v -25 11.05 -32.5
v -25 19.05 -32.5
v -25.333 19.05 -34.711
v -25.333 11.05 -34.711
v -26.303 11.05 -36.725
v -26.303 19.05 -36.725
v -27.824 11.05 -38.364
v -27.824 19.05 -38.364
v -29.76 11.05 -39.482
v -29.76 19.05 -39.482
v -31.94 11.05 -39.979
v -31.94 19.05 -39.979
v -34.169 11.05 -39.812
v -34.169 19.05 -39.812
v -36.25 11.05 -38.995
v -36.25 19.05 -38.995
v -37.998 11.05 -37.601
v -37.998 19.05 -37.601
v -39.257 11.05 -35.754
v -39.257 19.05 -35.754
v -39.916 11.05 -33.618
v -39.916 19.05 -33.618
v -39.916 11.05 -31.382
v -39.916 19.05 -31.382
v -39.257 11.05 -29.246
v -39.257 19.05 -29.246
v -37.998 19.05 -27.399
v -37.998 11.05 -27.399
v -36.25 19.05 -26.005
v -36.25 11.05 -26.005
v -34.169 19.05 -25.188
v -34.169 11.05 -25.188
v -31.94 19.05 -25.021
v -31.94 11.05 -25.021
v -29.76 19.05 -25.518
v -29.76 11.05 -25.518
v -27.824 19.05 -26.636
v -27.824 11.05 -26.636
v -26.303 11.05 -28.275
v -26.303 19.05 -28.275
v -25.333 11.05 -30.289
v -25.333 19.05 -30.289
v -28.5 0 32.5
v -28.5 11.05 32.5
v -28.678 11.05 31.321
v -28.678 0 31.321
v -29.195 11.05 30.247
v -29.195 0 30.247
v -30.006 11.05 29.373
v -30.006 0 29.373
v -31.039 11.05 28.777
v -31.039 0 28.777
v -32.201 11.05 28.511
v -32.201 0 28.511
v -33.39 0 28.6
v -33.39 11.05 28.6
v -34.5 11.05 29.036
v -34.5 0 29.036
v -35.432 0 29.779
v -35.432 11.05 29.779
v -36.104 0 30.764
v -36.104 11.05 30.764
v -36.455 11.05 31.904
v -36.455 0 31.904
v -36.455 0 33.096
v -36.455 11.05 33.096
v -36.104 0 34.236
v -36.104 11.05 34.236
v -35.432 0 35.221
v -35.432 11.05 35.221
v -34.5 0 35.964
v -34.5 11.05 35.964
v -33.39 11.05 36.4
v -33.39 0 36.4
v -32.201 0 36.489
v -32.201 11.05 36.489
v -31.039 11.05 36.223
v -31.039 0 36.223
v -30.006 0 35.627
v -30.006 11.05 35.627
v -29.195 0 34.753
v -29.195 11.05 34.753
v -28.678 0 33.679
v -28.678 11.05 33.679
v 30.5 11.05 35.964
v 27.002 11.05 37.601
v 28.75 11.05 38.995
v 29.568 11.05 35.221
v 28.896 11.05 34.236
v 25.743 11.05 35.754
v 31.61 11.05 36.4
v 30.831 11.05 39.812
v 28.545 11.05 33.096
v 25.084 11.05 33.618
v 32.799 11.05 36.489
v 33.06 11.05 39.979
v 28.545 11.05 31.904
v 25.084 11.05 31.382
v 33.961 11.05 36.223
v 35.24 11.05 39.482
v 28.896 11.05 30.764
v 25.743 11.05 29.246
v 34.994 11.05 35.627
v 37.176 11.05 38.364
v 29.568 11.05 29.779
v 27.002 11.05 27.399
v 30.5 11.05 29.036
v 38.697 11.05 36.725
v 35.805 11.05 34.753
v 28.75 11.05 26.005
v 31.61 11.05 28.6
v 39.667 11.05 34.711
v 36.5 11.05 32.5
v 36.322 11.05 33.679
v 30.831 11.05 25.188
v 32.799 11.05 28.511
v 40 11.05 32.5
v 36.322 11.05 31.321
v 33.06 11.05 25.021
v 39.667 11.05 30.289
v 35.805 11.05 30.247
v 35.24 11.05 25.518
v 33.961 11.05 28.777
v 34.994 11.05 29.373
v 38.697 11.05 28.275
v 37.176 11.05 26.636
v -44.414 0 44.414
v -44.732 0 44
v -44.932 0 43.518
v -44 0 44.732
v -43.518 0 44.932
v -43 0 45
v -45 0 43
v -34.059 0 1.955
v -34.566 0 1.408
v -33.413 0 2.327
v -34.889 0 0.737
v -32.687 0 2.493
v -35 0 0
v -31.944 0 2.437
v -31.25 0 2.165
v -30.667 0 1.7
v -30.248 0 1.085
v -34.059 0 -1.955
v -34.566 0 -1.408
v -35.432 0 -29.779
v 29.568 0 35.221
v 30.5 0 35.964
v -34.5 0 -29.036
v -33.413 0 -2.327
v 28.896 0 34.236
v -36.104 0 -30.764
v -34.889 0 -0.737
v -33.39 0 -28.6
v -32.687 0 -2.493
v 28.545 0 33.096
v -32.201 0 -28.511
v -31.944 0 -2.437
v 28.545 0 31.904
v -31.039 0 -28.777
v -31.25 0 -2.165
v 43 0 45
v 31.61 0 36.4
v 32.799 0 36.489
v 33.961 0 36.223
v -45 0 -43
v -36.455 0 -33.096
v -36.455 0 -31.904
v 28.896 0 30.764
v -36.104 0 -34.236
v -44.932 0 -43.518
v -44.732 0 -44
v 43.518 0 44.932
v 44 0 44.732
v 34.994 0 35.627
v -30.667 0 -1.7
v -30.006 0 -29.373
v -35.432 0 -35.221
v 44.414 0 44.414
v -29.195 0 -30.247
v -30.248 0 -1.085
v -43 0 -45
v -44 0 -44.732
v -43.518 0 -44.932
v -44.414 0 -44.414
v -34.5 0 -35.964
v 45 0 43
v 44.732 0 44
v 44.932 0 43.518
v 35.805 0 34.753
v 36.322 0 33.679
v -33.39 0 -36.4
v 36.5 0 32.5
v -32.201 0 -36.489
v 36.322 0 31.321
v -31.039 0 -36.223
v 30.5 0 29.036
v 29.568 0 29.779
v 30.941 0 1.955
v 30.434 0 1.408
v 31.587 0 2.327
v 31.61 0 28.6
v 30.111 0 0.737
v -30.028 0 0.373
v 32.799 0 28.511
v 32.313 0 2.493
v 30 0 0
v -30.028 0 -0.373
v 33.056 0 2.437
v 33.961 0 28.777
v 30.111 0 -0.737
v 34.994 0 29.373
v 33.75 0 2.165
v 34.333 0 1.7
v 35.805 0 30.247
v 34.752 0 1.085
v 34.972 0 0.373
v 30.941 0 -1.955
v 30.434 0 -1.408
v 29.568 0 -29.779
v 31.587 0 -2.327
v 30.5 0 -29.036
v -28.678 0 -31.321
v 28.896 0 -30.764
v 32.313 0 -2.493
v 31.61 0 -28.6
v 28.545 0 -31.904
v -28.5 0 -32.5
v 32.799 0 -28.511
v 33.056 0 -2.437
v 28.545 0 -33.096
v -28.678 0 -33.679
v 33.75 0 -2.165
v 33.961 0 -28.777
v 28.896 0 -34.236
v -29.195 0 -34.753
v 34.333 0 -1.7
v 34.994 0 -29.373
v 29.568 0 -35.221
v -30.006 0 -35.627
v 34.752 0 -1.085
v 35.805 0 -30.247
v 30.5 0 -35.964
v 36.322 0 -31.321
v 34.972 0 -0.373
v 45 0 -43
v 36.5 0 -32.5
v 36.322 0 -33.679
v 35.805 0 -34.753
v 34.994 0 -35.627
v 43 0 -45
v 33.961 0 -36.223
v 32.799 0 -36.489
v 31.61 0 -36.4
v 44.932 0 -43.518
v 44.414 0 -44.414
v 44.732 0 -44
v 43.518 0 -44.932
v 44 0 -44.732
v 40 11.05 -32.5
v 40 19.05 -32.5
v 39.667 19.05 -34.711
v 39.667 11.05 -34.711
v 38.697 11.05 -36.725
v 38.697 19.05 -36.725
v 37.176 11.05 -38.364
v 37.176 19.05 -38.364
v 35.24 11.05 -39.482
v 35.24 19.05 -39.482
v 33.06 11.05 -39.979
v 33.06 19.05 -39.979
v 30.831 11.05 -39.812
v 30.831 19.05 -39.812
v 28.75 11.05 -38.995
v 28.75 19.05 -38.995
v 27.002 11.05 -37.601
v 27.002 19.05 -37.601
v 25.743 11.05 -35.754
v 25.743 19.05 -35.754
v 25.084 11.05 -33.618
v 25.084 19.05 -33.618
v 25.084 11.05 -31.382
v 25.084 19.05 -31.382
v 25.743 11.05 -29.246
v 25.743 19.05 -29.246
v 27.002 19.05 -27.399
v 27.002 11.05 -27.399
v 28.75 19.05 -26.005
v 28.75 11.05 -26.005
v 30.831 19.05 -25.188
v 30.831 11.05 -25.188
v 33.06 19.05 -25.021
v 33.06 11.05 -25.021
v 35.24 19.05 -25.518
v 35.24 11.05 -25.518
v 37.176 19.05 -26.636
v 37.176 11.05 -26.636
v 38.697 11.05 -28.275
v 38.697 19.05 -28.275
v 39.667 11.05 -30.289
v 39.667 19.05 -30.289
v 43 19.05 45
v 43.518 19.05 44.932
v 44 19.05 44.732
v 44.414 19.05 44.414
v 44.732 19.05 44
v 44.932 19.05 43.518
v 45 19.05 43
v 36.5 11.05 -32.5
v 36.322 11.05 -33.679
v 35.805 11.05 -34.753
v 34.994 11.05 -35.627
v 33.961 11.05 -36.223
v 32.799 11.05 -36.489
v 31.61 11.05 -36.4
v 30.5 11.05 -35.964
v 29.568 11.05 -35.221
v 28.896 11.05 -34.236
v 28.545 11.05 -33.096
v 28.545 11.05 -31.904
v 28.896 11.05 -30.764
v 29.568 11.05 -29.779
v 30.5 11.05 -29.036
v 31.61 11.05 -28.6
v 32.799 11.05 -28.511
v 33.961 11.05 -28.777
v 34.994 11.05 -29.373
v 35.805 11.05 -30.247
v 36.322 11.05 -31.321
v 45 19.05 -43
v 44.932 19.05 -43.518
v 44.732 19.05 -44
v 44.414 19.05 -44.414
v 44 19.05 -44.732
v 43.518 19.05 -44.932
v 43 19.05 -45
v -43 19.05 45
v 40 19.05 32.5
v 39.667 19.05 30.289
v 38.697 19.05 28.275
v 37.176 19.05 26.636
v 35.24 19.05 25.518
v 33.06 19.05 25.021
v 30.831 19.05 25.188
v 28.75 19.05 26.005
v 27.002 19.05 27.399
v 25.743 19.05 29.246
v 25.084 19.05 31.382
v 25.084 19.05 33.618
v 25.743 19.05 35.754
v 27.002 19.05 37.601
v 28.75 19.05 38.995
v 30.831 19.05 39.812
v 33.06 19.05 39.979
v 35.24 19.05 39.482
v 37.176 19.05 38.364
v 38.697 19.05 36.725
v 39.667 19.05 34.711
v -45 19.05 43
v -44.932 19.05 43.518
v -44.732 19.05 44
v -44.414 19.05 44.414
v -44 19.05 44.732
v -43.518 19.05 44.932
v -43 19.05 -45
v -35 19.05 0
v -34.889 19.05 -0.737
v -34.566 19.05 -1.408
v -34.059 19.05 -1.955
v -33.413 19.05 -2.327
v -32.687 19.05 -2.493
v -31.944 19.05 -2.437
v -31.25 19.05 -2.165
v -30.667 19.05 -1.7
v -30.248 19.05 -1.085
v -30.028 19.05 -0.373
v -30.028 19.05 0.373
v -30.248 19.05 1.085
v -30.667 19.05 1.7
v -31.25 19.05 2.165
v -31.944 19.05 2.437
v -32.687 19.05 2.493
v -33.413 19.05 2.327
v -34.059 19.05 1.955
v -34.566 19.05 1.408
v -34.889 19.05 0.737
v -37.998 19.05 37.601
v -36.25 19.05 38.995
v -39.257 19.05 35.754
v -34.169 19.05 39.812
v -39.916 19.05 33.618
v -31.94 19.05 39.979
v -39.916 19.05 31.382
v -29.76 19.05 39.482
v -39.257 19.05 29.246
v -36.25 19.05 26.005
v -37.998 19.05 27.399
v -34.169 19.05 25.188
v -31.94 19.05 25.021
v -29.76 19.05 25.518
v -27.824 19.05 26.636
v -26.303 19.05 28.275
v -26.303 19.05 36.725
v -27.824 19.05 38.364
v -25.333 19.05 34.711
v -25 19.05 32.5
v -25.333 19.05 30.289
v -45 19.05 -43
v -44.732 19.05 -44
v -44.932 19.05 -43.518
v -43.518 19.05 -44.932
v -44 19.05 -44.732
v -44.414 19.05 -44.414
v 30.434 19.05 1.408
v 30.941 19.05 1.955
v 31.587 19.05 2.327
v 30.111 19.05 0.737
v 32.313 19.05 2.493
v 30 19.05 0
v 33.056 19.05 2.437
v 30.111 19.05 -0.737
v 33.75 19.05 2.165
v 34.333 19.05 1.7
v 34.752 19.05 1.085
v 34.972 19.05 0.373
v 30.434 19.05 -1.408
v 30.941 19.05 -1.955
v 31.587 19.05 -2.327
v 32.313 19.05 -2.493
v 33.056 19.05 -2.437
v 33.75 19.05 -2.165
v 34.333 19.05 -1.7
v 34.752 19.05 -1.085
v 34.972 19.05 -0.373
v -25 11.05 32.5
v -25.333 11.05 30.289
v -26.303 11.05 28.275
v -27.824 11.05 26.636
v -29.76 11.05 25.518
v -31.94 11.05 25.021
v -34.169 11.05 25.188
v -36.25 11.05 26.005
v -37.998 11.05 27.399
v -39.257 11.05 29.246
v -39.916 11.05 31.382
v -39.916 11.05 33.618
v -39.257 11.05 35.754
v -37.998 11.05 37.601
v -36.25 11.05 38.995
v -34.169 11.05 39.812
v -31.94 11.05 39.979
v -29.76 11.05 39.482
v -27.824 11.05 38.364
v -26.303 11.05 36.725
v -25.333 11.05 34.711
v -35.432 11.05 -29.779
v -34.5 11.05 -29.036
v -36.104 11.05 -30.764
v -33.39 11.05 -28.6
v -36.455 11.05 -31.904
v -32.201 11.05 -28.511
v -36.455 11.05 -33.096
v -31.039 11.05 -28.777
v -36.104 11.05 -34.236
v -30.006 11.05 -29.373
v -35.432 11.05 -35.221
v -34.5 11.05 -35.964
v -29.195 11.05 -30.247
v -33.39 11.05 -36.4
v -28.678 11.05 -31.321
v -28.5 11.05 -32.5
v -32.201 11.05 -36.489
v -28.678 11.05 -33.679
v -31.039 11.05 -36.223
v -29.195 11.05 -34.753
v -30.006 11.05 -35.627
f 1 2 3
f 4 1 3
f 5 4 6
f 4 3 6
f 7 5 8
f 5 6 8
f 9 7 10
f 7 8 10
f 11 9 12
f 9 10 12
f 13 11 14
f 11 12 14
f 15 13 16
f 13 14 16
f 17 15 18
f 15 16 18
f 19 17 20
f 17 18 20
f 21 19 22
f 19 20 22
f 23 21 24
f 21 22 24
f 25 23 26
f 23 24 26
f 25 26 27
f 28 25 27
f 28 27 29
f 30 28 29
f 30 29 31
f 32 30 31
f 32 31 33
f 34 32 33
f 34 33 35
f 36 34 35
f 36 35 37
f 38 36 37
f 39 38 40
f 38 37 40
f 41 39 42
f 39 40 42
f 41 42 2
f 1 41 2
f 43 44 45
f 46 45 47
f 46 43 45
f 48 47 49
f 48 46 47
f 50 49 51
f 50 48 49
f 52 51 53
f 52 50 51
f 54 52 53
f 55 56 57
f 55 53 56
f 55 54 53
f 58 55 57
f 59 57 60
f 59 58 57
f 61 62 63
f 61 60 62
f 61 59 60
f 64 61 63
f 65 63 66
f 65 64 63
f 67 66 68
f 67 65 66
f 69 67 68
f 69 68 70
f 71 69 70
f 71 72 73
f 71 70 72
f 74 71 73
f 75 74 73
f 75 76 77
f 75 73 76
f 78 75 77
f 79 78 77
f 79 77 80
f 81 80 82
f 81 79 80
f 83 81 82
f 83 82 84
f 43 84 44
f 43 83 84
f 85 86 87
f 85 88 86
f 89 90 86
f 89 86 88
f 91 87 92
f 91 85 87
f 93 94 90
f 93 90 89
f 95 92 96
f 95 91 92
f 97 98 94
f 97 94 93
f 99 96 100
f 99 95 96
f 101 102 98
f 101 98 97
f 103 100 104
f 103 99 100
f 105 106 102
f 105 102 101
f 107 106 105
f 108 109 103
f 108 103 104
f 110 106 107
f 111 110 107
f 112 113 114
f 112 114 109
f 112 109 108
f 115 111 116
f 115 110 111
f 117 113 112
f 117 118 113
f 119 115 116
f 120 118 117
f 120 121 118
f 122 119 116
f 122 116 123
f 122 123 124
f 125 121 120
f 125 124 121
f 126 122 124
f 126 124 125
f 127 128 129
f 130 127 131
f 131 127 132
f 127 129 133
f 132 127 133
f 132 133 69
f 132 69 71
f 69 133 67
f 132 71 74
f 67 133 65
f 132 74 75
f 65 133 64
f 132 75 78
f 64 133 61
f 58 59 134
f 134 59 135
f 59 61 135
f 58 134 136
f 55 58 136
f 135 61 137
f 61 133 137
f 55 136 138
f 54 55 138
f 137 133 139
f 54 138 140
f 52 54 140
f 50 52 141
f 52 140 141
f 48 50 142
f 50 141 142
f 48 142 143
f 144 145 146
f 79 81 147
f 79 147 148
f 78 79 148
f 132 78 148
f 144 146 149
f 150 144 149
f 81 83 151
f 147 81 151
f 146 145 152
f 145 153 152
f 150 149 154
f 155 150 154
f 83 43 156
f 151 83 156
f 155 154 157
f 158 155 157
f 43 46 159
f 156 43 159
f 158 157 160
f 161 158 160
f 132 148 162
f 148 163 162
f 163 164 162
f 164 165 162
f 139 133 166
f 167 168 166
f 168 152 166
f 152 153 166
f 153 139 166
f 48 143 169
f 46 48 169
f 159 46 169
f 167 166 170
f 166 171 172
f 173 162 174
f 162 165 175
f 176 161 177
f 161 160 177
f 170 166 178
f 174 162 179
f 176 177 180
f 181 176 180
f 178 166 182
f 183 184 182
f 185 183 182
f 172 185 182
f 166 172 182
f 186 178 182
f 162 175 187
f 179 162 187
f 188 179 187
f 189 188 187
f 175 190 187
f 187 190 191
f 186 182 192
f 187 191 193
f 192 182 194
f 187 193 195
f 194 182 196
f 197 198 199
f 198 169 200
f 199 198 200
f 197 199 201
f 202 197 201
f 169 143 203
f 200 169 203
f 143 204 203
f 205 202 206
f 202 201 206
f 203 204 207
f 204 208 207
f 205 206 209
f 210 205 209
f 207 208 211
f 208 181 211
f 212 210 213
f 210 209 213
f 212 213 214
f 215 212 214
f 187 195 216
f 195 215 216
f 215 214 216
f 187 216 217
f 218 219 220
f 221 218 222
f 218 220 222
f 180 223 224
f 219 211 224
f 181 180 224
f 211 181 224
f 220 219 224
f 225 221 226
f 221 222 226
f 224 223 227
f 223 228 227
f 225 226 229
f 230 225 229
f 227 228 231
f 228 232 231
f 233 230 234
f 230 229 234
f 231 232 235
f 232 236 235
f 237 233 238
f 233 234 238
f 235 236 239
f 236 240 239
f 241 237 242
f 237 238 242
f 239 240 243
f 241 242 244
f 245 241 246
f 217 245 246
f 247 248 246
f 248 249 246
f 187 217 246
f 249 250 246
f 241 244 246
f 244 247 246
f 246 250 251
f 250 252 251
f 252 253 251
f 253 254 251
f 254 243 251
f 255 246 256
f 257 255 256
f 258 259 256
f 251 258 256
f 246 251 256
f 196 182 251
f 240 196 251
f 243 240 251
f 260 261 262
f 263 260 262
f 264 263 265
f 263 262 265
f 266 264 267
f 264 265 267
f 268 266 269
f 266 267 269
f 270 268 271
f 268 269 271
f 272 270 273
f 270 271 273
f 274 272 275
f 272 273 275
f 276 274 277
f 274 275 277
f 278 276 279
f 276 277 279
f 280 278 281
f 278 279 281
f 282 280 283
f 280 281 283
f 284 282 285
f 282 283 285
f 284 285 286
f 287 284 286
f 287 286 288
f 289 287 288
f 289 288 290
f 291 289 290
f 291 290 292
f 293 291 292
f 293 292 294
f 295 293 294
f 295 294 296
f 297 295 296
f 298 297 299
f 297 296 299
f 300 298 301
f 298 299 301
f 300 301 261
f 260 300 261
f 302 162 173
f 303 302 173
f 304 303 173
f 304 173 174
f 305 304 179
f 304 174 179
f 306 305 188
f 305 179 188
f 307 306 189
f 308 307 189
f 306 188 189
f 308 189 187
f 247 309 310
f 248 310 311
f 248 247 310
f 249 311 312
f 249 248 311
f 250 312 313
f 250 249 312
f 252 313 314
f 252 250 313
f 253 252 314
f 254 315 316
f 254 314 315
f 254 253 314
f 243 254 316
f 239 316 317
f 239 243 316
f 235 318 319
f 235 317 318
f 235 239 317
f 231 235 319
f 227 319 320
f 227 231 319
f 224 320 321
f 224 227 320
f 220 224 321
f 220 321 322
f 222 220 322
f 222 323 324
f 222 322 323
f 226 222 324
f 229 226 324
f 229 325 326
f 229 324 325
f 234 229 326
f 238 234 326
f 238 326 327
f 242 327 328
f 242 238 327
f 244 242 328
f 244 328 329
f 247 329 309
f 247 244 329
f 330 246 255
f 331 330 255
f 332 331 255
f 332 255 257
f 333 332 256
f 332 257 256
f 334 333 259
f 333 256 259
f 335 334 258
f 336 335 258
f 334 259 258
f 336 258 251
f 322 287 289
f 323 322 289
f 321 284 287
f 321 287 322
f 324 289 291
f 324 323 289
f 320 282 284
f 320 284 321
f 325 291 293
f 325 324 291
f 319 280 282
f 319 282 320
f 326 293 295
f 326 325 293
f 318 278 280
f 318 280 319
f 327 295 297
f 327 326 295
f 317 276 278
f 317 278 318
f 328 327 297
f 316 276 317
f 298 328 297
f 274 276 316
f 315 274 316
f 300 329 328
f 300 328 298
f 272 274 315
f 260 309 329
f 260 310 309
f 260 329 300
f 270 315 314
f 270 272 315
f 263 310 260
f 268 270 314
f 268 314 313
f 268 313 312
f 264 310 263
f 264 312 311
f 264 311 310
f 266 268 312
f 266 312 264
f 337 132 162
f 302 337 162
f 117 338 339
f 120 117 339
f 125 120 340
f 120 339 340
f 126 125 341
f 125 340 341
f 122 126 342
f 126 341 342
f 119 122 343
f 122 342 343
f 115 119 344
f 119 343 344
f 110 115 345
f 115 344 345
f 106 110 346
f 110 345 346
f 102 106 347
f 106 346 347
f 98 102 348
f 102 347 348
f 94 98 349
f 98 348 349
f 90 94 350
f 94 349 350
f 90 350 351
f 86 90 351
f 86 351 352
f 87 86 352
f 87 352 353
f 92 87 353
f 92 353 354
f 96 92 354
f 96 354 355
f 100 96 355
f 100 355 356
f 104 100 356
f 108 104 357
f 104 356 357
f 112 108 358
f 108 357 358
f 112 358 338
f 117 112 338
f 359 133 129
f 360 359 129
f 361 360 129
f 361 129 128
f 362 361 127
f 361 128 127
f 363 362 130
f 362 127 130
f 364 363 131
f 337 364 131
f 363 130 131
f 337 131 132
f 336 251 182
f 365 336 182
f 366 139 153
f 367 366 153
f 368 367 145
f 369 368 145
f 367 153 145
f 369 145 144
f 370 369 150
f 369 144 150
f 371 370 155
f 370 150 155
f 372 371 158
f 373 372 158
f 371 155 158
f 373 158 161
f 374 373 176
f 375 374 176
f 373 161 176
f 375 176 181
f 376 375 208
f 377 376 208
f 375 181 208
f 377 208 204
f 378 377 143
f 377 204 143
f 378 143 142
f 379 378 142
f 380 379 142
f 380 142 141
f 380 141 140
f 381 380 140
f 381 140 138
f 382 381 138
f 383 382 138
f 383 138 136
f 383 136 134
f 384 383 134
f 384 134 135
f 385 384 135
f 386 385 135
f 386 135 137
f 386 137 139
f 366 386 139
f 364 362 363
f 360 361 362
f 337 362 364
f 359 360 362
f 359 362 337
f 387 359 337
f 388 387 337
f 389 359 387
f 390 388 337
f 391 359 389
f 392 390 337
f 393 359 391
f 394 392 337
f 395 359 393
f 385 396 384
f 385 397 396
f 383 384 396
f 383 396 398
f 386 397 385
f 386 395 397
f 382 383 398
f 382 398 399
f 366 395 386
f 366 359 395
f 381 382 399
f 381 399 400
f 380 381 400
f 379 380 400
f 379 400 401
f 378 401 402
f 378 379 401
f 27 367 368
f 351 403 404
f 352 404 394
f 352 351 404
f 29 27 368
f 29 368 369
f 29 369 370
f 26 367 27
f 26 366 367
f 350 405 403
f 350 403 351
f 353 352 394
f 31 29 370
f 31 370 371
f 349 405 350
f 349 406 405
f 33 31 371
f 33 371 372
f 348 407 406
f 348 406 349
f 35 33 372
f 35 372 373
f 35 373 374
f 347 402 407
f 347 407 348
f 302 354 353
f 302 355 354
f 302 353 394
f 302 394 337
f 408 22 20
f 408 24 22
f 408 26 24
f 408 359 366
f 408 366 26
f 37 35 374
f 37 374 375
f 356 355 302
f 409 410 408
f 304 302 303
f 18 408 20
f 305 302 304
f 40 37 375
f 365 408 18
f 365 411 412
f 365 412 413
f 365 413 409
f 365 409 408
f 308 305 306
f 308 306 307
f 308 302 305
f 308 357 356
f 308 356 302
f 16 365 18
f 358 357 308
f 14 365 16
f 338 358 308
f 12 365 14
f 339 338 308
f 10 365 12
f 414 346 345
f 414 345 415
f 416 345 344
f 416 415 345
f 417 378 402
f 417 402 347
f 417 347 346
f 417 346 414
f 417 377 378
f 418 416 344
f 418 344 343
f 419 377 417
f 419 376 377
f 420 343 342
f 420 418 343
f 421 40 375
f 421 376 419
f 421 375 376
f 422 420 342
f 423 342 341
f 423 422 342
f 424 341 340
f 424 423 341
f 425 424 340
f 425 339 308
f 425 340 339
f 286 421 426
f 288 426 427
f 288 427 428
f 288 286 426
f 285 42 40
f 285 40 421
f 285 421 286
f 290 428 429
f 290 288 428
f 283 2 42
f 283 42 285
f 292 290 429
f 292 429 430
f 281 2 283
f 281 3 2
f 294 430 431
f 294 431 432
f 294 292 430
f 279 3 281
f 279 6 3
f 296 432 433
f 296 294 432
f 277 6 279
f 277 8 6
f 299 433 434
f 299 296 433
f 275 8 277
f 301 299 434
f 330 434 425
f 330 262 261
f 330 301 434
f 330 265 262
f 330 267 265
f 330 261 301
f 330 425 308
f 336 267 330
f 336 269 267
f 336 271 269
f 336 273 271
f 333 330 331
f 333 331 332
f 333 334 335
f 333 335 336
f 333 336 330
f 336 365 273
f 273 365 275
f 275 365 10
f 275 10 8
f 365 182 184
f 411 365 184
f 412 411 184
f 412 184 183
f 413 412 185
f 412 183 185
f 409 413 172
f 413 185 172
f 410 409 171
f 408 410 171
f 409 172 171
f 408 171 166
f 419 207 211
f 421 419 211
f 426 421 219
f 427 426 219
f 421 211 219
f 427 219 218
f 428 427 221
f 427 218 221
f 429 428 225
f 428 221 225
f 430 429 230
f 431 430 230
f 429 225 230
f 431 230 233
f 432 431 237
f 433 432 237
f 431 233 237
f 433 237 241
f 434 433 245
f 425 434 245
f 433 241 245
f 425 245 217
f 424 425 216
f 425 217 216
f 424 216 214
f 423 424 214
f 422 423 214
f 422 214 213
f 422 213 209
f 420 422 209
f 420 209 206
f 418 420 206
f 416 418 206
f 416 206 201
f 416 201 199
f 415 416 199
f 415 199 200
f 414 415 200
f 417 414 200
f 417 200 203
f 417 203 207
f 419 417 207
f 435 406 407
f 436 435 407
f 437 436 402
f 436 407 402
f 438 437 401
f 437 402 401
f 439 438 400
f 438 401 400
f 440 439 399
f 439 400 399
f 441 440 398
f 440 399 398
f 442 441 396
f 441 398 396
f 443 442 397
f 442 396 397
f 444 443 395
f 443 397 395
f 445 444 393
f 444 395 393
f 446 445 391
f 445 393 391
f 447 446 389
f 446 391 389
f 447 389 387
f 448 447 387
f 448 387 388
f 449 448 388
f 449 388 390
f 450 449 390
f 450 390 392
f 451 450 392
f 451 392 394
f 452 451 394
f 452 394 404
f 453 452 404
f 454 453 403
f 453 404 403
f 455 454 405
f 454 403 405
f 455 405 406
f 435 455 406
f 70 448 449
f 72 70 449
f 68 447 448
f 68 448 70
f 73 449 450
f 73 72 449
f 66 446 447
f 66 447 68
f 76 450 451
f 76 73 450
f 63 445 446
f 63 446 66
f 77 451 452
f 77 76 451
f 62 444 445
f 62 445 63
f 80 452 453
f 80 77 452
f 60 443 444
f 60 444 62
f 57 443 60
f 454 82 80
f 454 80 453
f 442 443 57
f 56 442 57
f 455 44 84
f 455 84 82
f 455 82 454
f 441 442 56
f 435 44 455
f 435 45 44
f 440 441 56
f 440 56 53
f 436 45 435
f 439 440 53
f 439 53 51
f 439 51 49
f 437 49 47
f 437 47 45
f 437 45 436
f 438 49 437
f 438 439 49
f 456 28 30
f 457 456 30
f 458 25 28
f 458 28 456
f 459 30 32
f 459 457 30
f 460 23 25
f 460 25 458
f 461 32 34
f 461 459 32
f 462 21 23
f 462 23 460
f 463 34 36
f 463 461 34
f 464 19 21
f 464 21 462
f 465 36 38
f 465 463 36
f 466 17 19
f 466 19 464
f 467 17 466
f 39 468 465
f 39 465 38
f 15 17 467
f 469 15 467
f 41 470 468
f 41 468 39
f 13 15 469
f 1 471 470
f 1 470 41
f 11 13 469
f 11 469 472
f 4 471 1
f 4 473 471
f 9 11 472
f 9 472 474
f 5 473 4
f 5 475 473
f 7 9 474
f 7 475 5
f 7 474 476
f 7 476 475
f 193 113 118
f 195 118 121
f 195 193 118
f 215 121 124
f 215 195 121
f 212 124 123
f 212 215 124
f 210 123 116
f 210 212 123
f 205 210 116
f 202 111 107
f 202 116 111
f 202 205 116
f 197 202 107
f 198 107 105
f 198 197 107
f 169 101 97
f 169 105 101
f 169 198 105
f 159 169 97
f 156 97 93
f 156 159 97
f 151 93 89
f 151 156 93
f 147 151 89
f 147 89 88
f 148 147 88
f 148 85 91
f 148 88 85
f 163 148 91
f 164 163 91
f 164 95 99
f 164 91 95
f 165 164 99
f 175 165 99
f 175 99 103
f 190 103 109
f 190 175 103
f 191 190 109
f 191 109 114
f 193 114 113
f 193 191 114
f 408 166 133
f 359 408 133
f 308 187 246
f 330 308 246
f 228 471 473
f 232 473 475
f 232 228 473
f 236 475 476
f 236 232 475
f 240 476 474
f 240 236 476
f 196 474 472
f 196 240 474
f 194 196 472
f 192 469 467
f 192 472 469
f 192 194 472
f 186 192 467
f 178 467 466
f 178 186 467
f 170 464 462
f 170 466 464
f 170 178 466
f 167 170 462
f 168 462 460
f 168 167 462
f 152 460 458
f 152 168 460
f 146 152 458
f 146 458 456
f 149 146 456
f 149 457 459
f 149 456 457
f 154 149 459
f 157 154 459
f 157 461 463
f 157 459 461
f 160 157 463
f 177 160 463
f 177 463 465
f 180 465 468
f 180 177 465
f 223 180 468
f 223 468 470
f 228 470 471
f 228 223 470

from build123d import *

# Parameters (mm, degrees)
SKETCH1_R             = 4
BOSS_EXTRUDE1_DEPTH   = 19.05
SKETCH2_R             = 7.5
CUT_EXTRUDE1_DEPTH    = 8
M6X1_0_TAPPED_HOLE1_D = 5


with BuildPart() as part:
    # Sketch1 → Boss-Extrude1 (new body)
    with BuildSketch(Plane(origin=(0, 0, 0), x_dir=(1, 0, 0), z_dir=(0, 1, 0))):
        with BuildLine():
            Line((-43, -45), (43, -45))
            ThreePointArc((43, -45), (44.414213562, -44.414213562), (45, -43))
            Line((45, -43), (45, 43))
            ThreePointArc((45, 43), (44.414213562, 44.414213562), (43, 45))
            Line((43, 45), (-43, 45))
            ThreePointArc((-43, 45), (-44.414213562, 44.414213562), (-45, 43))
            Line((-45, 43), (-45, -43))
            ThreePointArc((-45, -43), (-44.414213562, -44.414213562), (-43, -45))
        make_face()
        with Locations((-32.5, 32.5)):
            Circle(SKETCH1_R, mode=Mode.SUBTRACT)
        with Locations((32.5, 32.5)):
            Circle(SKETCH1_R, mode=Mode.SUBTRACT)
        with Locations((32.5, -32.5)):
            Circle(SKETCH1_R, mode=Mode.SUBTRACT)
        with Locations((-32.5, -32.5)):
            Circle(SKETCH1_R, mode=Mode.SUBTRACT)
    extrude(amount=BOSS_EXTRUDE1_DEPTH)

    # Sketch2 → Cut-Extrude1 (cut)
    with BuildSketch(Plane(origin=(0, 19.05, 0), x_dir=(1, 0, 0), z_dir=(0, 1, 0))):
        with Locations((-32.5, -32.5)):
            Circle(SKETCH2_R)
        with Locations((32.5, -32.5)):
            Circle(SKETCH2_R)
        with Locations((32.5, 32.5)):
            Circle(SKETCH2_R)
        with Locations((-32.5, 32.5)):
            Circle(SKETCH2_R)
    extrude(amount=-CUT_EXTRUDE1_DEPTH, mode=Mode.SUBTRACT)

    # M6x1.0 Tapped Hole1 (through all)
    with Locations(Plane(origin=(0, 19.05, 0), x_dir=(1, 0, 0), z_dir=(0, 1, 0))):
        with Locations((-32.5, 0), (32.5, 0)):
            Hole(M6X1_0_TAPPED_HOLE1_D / 2)


solid = part.part
